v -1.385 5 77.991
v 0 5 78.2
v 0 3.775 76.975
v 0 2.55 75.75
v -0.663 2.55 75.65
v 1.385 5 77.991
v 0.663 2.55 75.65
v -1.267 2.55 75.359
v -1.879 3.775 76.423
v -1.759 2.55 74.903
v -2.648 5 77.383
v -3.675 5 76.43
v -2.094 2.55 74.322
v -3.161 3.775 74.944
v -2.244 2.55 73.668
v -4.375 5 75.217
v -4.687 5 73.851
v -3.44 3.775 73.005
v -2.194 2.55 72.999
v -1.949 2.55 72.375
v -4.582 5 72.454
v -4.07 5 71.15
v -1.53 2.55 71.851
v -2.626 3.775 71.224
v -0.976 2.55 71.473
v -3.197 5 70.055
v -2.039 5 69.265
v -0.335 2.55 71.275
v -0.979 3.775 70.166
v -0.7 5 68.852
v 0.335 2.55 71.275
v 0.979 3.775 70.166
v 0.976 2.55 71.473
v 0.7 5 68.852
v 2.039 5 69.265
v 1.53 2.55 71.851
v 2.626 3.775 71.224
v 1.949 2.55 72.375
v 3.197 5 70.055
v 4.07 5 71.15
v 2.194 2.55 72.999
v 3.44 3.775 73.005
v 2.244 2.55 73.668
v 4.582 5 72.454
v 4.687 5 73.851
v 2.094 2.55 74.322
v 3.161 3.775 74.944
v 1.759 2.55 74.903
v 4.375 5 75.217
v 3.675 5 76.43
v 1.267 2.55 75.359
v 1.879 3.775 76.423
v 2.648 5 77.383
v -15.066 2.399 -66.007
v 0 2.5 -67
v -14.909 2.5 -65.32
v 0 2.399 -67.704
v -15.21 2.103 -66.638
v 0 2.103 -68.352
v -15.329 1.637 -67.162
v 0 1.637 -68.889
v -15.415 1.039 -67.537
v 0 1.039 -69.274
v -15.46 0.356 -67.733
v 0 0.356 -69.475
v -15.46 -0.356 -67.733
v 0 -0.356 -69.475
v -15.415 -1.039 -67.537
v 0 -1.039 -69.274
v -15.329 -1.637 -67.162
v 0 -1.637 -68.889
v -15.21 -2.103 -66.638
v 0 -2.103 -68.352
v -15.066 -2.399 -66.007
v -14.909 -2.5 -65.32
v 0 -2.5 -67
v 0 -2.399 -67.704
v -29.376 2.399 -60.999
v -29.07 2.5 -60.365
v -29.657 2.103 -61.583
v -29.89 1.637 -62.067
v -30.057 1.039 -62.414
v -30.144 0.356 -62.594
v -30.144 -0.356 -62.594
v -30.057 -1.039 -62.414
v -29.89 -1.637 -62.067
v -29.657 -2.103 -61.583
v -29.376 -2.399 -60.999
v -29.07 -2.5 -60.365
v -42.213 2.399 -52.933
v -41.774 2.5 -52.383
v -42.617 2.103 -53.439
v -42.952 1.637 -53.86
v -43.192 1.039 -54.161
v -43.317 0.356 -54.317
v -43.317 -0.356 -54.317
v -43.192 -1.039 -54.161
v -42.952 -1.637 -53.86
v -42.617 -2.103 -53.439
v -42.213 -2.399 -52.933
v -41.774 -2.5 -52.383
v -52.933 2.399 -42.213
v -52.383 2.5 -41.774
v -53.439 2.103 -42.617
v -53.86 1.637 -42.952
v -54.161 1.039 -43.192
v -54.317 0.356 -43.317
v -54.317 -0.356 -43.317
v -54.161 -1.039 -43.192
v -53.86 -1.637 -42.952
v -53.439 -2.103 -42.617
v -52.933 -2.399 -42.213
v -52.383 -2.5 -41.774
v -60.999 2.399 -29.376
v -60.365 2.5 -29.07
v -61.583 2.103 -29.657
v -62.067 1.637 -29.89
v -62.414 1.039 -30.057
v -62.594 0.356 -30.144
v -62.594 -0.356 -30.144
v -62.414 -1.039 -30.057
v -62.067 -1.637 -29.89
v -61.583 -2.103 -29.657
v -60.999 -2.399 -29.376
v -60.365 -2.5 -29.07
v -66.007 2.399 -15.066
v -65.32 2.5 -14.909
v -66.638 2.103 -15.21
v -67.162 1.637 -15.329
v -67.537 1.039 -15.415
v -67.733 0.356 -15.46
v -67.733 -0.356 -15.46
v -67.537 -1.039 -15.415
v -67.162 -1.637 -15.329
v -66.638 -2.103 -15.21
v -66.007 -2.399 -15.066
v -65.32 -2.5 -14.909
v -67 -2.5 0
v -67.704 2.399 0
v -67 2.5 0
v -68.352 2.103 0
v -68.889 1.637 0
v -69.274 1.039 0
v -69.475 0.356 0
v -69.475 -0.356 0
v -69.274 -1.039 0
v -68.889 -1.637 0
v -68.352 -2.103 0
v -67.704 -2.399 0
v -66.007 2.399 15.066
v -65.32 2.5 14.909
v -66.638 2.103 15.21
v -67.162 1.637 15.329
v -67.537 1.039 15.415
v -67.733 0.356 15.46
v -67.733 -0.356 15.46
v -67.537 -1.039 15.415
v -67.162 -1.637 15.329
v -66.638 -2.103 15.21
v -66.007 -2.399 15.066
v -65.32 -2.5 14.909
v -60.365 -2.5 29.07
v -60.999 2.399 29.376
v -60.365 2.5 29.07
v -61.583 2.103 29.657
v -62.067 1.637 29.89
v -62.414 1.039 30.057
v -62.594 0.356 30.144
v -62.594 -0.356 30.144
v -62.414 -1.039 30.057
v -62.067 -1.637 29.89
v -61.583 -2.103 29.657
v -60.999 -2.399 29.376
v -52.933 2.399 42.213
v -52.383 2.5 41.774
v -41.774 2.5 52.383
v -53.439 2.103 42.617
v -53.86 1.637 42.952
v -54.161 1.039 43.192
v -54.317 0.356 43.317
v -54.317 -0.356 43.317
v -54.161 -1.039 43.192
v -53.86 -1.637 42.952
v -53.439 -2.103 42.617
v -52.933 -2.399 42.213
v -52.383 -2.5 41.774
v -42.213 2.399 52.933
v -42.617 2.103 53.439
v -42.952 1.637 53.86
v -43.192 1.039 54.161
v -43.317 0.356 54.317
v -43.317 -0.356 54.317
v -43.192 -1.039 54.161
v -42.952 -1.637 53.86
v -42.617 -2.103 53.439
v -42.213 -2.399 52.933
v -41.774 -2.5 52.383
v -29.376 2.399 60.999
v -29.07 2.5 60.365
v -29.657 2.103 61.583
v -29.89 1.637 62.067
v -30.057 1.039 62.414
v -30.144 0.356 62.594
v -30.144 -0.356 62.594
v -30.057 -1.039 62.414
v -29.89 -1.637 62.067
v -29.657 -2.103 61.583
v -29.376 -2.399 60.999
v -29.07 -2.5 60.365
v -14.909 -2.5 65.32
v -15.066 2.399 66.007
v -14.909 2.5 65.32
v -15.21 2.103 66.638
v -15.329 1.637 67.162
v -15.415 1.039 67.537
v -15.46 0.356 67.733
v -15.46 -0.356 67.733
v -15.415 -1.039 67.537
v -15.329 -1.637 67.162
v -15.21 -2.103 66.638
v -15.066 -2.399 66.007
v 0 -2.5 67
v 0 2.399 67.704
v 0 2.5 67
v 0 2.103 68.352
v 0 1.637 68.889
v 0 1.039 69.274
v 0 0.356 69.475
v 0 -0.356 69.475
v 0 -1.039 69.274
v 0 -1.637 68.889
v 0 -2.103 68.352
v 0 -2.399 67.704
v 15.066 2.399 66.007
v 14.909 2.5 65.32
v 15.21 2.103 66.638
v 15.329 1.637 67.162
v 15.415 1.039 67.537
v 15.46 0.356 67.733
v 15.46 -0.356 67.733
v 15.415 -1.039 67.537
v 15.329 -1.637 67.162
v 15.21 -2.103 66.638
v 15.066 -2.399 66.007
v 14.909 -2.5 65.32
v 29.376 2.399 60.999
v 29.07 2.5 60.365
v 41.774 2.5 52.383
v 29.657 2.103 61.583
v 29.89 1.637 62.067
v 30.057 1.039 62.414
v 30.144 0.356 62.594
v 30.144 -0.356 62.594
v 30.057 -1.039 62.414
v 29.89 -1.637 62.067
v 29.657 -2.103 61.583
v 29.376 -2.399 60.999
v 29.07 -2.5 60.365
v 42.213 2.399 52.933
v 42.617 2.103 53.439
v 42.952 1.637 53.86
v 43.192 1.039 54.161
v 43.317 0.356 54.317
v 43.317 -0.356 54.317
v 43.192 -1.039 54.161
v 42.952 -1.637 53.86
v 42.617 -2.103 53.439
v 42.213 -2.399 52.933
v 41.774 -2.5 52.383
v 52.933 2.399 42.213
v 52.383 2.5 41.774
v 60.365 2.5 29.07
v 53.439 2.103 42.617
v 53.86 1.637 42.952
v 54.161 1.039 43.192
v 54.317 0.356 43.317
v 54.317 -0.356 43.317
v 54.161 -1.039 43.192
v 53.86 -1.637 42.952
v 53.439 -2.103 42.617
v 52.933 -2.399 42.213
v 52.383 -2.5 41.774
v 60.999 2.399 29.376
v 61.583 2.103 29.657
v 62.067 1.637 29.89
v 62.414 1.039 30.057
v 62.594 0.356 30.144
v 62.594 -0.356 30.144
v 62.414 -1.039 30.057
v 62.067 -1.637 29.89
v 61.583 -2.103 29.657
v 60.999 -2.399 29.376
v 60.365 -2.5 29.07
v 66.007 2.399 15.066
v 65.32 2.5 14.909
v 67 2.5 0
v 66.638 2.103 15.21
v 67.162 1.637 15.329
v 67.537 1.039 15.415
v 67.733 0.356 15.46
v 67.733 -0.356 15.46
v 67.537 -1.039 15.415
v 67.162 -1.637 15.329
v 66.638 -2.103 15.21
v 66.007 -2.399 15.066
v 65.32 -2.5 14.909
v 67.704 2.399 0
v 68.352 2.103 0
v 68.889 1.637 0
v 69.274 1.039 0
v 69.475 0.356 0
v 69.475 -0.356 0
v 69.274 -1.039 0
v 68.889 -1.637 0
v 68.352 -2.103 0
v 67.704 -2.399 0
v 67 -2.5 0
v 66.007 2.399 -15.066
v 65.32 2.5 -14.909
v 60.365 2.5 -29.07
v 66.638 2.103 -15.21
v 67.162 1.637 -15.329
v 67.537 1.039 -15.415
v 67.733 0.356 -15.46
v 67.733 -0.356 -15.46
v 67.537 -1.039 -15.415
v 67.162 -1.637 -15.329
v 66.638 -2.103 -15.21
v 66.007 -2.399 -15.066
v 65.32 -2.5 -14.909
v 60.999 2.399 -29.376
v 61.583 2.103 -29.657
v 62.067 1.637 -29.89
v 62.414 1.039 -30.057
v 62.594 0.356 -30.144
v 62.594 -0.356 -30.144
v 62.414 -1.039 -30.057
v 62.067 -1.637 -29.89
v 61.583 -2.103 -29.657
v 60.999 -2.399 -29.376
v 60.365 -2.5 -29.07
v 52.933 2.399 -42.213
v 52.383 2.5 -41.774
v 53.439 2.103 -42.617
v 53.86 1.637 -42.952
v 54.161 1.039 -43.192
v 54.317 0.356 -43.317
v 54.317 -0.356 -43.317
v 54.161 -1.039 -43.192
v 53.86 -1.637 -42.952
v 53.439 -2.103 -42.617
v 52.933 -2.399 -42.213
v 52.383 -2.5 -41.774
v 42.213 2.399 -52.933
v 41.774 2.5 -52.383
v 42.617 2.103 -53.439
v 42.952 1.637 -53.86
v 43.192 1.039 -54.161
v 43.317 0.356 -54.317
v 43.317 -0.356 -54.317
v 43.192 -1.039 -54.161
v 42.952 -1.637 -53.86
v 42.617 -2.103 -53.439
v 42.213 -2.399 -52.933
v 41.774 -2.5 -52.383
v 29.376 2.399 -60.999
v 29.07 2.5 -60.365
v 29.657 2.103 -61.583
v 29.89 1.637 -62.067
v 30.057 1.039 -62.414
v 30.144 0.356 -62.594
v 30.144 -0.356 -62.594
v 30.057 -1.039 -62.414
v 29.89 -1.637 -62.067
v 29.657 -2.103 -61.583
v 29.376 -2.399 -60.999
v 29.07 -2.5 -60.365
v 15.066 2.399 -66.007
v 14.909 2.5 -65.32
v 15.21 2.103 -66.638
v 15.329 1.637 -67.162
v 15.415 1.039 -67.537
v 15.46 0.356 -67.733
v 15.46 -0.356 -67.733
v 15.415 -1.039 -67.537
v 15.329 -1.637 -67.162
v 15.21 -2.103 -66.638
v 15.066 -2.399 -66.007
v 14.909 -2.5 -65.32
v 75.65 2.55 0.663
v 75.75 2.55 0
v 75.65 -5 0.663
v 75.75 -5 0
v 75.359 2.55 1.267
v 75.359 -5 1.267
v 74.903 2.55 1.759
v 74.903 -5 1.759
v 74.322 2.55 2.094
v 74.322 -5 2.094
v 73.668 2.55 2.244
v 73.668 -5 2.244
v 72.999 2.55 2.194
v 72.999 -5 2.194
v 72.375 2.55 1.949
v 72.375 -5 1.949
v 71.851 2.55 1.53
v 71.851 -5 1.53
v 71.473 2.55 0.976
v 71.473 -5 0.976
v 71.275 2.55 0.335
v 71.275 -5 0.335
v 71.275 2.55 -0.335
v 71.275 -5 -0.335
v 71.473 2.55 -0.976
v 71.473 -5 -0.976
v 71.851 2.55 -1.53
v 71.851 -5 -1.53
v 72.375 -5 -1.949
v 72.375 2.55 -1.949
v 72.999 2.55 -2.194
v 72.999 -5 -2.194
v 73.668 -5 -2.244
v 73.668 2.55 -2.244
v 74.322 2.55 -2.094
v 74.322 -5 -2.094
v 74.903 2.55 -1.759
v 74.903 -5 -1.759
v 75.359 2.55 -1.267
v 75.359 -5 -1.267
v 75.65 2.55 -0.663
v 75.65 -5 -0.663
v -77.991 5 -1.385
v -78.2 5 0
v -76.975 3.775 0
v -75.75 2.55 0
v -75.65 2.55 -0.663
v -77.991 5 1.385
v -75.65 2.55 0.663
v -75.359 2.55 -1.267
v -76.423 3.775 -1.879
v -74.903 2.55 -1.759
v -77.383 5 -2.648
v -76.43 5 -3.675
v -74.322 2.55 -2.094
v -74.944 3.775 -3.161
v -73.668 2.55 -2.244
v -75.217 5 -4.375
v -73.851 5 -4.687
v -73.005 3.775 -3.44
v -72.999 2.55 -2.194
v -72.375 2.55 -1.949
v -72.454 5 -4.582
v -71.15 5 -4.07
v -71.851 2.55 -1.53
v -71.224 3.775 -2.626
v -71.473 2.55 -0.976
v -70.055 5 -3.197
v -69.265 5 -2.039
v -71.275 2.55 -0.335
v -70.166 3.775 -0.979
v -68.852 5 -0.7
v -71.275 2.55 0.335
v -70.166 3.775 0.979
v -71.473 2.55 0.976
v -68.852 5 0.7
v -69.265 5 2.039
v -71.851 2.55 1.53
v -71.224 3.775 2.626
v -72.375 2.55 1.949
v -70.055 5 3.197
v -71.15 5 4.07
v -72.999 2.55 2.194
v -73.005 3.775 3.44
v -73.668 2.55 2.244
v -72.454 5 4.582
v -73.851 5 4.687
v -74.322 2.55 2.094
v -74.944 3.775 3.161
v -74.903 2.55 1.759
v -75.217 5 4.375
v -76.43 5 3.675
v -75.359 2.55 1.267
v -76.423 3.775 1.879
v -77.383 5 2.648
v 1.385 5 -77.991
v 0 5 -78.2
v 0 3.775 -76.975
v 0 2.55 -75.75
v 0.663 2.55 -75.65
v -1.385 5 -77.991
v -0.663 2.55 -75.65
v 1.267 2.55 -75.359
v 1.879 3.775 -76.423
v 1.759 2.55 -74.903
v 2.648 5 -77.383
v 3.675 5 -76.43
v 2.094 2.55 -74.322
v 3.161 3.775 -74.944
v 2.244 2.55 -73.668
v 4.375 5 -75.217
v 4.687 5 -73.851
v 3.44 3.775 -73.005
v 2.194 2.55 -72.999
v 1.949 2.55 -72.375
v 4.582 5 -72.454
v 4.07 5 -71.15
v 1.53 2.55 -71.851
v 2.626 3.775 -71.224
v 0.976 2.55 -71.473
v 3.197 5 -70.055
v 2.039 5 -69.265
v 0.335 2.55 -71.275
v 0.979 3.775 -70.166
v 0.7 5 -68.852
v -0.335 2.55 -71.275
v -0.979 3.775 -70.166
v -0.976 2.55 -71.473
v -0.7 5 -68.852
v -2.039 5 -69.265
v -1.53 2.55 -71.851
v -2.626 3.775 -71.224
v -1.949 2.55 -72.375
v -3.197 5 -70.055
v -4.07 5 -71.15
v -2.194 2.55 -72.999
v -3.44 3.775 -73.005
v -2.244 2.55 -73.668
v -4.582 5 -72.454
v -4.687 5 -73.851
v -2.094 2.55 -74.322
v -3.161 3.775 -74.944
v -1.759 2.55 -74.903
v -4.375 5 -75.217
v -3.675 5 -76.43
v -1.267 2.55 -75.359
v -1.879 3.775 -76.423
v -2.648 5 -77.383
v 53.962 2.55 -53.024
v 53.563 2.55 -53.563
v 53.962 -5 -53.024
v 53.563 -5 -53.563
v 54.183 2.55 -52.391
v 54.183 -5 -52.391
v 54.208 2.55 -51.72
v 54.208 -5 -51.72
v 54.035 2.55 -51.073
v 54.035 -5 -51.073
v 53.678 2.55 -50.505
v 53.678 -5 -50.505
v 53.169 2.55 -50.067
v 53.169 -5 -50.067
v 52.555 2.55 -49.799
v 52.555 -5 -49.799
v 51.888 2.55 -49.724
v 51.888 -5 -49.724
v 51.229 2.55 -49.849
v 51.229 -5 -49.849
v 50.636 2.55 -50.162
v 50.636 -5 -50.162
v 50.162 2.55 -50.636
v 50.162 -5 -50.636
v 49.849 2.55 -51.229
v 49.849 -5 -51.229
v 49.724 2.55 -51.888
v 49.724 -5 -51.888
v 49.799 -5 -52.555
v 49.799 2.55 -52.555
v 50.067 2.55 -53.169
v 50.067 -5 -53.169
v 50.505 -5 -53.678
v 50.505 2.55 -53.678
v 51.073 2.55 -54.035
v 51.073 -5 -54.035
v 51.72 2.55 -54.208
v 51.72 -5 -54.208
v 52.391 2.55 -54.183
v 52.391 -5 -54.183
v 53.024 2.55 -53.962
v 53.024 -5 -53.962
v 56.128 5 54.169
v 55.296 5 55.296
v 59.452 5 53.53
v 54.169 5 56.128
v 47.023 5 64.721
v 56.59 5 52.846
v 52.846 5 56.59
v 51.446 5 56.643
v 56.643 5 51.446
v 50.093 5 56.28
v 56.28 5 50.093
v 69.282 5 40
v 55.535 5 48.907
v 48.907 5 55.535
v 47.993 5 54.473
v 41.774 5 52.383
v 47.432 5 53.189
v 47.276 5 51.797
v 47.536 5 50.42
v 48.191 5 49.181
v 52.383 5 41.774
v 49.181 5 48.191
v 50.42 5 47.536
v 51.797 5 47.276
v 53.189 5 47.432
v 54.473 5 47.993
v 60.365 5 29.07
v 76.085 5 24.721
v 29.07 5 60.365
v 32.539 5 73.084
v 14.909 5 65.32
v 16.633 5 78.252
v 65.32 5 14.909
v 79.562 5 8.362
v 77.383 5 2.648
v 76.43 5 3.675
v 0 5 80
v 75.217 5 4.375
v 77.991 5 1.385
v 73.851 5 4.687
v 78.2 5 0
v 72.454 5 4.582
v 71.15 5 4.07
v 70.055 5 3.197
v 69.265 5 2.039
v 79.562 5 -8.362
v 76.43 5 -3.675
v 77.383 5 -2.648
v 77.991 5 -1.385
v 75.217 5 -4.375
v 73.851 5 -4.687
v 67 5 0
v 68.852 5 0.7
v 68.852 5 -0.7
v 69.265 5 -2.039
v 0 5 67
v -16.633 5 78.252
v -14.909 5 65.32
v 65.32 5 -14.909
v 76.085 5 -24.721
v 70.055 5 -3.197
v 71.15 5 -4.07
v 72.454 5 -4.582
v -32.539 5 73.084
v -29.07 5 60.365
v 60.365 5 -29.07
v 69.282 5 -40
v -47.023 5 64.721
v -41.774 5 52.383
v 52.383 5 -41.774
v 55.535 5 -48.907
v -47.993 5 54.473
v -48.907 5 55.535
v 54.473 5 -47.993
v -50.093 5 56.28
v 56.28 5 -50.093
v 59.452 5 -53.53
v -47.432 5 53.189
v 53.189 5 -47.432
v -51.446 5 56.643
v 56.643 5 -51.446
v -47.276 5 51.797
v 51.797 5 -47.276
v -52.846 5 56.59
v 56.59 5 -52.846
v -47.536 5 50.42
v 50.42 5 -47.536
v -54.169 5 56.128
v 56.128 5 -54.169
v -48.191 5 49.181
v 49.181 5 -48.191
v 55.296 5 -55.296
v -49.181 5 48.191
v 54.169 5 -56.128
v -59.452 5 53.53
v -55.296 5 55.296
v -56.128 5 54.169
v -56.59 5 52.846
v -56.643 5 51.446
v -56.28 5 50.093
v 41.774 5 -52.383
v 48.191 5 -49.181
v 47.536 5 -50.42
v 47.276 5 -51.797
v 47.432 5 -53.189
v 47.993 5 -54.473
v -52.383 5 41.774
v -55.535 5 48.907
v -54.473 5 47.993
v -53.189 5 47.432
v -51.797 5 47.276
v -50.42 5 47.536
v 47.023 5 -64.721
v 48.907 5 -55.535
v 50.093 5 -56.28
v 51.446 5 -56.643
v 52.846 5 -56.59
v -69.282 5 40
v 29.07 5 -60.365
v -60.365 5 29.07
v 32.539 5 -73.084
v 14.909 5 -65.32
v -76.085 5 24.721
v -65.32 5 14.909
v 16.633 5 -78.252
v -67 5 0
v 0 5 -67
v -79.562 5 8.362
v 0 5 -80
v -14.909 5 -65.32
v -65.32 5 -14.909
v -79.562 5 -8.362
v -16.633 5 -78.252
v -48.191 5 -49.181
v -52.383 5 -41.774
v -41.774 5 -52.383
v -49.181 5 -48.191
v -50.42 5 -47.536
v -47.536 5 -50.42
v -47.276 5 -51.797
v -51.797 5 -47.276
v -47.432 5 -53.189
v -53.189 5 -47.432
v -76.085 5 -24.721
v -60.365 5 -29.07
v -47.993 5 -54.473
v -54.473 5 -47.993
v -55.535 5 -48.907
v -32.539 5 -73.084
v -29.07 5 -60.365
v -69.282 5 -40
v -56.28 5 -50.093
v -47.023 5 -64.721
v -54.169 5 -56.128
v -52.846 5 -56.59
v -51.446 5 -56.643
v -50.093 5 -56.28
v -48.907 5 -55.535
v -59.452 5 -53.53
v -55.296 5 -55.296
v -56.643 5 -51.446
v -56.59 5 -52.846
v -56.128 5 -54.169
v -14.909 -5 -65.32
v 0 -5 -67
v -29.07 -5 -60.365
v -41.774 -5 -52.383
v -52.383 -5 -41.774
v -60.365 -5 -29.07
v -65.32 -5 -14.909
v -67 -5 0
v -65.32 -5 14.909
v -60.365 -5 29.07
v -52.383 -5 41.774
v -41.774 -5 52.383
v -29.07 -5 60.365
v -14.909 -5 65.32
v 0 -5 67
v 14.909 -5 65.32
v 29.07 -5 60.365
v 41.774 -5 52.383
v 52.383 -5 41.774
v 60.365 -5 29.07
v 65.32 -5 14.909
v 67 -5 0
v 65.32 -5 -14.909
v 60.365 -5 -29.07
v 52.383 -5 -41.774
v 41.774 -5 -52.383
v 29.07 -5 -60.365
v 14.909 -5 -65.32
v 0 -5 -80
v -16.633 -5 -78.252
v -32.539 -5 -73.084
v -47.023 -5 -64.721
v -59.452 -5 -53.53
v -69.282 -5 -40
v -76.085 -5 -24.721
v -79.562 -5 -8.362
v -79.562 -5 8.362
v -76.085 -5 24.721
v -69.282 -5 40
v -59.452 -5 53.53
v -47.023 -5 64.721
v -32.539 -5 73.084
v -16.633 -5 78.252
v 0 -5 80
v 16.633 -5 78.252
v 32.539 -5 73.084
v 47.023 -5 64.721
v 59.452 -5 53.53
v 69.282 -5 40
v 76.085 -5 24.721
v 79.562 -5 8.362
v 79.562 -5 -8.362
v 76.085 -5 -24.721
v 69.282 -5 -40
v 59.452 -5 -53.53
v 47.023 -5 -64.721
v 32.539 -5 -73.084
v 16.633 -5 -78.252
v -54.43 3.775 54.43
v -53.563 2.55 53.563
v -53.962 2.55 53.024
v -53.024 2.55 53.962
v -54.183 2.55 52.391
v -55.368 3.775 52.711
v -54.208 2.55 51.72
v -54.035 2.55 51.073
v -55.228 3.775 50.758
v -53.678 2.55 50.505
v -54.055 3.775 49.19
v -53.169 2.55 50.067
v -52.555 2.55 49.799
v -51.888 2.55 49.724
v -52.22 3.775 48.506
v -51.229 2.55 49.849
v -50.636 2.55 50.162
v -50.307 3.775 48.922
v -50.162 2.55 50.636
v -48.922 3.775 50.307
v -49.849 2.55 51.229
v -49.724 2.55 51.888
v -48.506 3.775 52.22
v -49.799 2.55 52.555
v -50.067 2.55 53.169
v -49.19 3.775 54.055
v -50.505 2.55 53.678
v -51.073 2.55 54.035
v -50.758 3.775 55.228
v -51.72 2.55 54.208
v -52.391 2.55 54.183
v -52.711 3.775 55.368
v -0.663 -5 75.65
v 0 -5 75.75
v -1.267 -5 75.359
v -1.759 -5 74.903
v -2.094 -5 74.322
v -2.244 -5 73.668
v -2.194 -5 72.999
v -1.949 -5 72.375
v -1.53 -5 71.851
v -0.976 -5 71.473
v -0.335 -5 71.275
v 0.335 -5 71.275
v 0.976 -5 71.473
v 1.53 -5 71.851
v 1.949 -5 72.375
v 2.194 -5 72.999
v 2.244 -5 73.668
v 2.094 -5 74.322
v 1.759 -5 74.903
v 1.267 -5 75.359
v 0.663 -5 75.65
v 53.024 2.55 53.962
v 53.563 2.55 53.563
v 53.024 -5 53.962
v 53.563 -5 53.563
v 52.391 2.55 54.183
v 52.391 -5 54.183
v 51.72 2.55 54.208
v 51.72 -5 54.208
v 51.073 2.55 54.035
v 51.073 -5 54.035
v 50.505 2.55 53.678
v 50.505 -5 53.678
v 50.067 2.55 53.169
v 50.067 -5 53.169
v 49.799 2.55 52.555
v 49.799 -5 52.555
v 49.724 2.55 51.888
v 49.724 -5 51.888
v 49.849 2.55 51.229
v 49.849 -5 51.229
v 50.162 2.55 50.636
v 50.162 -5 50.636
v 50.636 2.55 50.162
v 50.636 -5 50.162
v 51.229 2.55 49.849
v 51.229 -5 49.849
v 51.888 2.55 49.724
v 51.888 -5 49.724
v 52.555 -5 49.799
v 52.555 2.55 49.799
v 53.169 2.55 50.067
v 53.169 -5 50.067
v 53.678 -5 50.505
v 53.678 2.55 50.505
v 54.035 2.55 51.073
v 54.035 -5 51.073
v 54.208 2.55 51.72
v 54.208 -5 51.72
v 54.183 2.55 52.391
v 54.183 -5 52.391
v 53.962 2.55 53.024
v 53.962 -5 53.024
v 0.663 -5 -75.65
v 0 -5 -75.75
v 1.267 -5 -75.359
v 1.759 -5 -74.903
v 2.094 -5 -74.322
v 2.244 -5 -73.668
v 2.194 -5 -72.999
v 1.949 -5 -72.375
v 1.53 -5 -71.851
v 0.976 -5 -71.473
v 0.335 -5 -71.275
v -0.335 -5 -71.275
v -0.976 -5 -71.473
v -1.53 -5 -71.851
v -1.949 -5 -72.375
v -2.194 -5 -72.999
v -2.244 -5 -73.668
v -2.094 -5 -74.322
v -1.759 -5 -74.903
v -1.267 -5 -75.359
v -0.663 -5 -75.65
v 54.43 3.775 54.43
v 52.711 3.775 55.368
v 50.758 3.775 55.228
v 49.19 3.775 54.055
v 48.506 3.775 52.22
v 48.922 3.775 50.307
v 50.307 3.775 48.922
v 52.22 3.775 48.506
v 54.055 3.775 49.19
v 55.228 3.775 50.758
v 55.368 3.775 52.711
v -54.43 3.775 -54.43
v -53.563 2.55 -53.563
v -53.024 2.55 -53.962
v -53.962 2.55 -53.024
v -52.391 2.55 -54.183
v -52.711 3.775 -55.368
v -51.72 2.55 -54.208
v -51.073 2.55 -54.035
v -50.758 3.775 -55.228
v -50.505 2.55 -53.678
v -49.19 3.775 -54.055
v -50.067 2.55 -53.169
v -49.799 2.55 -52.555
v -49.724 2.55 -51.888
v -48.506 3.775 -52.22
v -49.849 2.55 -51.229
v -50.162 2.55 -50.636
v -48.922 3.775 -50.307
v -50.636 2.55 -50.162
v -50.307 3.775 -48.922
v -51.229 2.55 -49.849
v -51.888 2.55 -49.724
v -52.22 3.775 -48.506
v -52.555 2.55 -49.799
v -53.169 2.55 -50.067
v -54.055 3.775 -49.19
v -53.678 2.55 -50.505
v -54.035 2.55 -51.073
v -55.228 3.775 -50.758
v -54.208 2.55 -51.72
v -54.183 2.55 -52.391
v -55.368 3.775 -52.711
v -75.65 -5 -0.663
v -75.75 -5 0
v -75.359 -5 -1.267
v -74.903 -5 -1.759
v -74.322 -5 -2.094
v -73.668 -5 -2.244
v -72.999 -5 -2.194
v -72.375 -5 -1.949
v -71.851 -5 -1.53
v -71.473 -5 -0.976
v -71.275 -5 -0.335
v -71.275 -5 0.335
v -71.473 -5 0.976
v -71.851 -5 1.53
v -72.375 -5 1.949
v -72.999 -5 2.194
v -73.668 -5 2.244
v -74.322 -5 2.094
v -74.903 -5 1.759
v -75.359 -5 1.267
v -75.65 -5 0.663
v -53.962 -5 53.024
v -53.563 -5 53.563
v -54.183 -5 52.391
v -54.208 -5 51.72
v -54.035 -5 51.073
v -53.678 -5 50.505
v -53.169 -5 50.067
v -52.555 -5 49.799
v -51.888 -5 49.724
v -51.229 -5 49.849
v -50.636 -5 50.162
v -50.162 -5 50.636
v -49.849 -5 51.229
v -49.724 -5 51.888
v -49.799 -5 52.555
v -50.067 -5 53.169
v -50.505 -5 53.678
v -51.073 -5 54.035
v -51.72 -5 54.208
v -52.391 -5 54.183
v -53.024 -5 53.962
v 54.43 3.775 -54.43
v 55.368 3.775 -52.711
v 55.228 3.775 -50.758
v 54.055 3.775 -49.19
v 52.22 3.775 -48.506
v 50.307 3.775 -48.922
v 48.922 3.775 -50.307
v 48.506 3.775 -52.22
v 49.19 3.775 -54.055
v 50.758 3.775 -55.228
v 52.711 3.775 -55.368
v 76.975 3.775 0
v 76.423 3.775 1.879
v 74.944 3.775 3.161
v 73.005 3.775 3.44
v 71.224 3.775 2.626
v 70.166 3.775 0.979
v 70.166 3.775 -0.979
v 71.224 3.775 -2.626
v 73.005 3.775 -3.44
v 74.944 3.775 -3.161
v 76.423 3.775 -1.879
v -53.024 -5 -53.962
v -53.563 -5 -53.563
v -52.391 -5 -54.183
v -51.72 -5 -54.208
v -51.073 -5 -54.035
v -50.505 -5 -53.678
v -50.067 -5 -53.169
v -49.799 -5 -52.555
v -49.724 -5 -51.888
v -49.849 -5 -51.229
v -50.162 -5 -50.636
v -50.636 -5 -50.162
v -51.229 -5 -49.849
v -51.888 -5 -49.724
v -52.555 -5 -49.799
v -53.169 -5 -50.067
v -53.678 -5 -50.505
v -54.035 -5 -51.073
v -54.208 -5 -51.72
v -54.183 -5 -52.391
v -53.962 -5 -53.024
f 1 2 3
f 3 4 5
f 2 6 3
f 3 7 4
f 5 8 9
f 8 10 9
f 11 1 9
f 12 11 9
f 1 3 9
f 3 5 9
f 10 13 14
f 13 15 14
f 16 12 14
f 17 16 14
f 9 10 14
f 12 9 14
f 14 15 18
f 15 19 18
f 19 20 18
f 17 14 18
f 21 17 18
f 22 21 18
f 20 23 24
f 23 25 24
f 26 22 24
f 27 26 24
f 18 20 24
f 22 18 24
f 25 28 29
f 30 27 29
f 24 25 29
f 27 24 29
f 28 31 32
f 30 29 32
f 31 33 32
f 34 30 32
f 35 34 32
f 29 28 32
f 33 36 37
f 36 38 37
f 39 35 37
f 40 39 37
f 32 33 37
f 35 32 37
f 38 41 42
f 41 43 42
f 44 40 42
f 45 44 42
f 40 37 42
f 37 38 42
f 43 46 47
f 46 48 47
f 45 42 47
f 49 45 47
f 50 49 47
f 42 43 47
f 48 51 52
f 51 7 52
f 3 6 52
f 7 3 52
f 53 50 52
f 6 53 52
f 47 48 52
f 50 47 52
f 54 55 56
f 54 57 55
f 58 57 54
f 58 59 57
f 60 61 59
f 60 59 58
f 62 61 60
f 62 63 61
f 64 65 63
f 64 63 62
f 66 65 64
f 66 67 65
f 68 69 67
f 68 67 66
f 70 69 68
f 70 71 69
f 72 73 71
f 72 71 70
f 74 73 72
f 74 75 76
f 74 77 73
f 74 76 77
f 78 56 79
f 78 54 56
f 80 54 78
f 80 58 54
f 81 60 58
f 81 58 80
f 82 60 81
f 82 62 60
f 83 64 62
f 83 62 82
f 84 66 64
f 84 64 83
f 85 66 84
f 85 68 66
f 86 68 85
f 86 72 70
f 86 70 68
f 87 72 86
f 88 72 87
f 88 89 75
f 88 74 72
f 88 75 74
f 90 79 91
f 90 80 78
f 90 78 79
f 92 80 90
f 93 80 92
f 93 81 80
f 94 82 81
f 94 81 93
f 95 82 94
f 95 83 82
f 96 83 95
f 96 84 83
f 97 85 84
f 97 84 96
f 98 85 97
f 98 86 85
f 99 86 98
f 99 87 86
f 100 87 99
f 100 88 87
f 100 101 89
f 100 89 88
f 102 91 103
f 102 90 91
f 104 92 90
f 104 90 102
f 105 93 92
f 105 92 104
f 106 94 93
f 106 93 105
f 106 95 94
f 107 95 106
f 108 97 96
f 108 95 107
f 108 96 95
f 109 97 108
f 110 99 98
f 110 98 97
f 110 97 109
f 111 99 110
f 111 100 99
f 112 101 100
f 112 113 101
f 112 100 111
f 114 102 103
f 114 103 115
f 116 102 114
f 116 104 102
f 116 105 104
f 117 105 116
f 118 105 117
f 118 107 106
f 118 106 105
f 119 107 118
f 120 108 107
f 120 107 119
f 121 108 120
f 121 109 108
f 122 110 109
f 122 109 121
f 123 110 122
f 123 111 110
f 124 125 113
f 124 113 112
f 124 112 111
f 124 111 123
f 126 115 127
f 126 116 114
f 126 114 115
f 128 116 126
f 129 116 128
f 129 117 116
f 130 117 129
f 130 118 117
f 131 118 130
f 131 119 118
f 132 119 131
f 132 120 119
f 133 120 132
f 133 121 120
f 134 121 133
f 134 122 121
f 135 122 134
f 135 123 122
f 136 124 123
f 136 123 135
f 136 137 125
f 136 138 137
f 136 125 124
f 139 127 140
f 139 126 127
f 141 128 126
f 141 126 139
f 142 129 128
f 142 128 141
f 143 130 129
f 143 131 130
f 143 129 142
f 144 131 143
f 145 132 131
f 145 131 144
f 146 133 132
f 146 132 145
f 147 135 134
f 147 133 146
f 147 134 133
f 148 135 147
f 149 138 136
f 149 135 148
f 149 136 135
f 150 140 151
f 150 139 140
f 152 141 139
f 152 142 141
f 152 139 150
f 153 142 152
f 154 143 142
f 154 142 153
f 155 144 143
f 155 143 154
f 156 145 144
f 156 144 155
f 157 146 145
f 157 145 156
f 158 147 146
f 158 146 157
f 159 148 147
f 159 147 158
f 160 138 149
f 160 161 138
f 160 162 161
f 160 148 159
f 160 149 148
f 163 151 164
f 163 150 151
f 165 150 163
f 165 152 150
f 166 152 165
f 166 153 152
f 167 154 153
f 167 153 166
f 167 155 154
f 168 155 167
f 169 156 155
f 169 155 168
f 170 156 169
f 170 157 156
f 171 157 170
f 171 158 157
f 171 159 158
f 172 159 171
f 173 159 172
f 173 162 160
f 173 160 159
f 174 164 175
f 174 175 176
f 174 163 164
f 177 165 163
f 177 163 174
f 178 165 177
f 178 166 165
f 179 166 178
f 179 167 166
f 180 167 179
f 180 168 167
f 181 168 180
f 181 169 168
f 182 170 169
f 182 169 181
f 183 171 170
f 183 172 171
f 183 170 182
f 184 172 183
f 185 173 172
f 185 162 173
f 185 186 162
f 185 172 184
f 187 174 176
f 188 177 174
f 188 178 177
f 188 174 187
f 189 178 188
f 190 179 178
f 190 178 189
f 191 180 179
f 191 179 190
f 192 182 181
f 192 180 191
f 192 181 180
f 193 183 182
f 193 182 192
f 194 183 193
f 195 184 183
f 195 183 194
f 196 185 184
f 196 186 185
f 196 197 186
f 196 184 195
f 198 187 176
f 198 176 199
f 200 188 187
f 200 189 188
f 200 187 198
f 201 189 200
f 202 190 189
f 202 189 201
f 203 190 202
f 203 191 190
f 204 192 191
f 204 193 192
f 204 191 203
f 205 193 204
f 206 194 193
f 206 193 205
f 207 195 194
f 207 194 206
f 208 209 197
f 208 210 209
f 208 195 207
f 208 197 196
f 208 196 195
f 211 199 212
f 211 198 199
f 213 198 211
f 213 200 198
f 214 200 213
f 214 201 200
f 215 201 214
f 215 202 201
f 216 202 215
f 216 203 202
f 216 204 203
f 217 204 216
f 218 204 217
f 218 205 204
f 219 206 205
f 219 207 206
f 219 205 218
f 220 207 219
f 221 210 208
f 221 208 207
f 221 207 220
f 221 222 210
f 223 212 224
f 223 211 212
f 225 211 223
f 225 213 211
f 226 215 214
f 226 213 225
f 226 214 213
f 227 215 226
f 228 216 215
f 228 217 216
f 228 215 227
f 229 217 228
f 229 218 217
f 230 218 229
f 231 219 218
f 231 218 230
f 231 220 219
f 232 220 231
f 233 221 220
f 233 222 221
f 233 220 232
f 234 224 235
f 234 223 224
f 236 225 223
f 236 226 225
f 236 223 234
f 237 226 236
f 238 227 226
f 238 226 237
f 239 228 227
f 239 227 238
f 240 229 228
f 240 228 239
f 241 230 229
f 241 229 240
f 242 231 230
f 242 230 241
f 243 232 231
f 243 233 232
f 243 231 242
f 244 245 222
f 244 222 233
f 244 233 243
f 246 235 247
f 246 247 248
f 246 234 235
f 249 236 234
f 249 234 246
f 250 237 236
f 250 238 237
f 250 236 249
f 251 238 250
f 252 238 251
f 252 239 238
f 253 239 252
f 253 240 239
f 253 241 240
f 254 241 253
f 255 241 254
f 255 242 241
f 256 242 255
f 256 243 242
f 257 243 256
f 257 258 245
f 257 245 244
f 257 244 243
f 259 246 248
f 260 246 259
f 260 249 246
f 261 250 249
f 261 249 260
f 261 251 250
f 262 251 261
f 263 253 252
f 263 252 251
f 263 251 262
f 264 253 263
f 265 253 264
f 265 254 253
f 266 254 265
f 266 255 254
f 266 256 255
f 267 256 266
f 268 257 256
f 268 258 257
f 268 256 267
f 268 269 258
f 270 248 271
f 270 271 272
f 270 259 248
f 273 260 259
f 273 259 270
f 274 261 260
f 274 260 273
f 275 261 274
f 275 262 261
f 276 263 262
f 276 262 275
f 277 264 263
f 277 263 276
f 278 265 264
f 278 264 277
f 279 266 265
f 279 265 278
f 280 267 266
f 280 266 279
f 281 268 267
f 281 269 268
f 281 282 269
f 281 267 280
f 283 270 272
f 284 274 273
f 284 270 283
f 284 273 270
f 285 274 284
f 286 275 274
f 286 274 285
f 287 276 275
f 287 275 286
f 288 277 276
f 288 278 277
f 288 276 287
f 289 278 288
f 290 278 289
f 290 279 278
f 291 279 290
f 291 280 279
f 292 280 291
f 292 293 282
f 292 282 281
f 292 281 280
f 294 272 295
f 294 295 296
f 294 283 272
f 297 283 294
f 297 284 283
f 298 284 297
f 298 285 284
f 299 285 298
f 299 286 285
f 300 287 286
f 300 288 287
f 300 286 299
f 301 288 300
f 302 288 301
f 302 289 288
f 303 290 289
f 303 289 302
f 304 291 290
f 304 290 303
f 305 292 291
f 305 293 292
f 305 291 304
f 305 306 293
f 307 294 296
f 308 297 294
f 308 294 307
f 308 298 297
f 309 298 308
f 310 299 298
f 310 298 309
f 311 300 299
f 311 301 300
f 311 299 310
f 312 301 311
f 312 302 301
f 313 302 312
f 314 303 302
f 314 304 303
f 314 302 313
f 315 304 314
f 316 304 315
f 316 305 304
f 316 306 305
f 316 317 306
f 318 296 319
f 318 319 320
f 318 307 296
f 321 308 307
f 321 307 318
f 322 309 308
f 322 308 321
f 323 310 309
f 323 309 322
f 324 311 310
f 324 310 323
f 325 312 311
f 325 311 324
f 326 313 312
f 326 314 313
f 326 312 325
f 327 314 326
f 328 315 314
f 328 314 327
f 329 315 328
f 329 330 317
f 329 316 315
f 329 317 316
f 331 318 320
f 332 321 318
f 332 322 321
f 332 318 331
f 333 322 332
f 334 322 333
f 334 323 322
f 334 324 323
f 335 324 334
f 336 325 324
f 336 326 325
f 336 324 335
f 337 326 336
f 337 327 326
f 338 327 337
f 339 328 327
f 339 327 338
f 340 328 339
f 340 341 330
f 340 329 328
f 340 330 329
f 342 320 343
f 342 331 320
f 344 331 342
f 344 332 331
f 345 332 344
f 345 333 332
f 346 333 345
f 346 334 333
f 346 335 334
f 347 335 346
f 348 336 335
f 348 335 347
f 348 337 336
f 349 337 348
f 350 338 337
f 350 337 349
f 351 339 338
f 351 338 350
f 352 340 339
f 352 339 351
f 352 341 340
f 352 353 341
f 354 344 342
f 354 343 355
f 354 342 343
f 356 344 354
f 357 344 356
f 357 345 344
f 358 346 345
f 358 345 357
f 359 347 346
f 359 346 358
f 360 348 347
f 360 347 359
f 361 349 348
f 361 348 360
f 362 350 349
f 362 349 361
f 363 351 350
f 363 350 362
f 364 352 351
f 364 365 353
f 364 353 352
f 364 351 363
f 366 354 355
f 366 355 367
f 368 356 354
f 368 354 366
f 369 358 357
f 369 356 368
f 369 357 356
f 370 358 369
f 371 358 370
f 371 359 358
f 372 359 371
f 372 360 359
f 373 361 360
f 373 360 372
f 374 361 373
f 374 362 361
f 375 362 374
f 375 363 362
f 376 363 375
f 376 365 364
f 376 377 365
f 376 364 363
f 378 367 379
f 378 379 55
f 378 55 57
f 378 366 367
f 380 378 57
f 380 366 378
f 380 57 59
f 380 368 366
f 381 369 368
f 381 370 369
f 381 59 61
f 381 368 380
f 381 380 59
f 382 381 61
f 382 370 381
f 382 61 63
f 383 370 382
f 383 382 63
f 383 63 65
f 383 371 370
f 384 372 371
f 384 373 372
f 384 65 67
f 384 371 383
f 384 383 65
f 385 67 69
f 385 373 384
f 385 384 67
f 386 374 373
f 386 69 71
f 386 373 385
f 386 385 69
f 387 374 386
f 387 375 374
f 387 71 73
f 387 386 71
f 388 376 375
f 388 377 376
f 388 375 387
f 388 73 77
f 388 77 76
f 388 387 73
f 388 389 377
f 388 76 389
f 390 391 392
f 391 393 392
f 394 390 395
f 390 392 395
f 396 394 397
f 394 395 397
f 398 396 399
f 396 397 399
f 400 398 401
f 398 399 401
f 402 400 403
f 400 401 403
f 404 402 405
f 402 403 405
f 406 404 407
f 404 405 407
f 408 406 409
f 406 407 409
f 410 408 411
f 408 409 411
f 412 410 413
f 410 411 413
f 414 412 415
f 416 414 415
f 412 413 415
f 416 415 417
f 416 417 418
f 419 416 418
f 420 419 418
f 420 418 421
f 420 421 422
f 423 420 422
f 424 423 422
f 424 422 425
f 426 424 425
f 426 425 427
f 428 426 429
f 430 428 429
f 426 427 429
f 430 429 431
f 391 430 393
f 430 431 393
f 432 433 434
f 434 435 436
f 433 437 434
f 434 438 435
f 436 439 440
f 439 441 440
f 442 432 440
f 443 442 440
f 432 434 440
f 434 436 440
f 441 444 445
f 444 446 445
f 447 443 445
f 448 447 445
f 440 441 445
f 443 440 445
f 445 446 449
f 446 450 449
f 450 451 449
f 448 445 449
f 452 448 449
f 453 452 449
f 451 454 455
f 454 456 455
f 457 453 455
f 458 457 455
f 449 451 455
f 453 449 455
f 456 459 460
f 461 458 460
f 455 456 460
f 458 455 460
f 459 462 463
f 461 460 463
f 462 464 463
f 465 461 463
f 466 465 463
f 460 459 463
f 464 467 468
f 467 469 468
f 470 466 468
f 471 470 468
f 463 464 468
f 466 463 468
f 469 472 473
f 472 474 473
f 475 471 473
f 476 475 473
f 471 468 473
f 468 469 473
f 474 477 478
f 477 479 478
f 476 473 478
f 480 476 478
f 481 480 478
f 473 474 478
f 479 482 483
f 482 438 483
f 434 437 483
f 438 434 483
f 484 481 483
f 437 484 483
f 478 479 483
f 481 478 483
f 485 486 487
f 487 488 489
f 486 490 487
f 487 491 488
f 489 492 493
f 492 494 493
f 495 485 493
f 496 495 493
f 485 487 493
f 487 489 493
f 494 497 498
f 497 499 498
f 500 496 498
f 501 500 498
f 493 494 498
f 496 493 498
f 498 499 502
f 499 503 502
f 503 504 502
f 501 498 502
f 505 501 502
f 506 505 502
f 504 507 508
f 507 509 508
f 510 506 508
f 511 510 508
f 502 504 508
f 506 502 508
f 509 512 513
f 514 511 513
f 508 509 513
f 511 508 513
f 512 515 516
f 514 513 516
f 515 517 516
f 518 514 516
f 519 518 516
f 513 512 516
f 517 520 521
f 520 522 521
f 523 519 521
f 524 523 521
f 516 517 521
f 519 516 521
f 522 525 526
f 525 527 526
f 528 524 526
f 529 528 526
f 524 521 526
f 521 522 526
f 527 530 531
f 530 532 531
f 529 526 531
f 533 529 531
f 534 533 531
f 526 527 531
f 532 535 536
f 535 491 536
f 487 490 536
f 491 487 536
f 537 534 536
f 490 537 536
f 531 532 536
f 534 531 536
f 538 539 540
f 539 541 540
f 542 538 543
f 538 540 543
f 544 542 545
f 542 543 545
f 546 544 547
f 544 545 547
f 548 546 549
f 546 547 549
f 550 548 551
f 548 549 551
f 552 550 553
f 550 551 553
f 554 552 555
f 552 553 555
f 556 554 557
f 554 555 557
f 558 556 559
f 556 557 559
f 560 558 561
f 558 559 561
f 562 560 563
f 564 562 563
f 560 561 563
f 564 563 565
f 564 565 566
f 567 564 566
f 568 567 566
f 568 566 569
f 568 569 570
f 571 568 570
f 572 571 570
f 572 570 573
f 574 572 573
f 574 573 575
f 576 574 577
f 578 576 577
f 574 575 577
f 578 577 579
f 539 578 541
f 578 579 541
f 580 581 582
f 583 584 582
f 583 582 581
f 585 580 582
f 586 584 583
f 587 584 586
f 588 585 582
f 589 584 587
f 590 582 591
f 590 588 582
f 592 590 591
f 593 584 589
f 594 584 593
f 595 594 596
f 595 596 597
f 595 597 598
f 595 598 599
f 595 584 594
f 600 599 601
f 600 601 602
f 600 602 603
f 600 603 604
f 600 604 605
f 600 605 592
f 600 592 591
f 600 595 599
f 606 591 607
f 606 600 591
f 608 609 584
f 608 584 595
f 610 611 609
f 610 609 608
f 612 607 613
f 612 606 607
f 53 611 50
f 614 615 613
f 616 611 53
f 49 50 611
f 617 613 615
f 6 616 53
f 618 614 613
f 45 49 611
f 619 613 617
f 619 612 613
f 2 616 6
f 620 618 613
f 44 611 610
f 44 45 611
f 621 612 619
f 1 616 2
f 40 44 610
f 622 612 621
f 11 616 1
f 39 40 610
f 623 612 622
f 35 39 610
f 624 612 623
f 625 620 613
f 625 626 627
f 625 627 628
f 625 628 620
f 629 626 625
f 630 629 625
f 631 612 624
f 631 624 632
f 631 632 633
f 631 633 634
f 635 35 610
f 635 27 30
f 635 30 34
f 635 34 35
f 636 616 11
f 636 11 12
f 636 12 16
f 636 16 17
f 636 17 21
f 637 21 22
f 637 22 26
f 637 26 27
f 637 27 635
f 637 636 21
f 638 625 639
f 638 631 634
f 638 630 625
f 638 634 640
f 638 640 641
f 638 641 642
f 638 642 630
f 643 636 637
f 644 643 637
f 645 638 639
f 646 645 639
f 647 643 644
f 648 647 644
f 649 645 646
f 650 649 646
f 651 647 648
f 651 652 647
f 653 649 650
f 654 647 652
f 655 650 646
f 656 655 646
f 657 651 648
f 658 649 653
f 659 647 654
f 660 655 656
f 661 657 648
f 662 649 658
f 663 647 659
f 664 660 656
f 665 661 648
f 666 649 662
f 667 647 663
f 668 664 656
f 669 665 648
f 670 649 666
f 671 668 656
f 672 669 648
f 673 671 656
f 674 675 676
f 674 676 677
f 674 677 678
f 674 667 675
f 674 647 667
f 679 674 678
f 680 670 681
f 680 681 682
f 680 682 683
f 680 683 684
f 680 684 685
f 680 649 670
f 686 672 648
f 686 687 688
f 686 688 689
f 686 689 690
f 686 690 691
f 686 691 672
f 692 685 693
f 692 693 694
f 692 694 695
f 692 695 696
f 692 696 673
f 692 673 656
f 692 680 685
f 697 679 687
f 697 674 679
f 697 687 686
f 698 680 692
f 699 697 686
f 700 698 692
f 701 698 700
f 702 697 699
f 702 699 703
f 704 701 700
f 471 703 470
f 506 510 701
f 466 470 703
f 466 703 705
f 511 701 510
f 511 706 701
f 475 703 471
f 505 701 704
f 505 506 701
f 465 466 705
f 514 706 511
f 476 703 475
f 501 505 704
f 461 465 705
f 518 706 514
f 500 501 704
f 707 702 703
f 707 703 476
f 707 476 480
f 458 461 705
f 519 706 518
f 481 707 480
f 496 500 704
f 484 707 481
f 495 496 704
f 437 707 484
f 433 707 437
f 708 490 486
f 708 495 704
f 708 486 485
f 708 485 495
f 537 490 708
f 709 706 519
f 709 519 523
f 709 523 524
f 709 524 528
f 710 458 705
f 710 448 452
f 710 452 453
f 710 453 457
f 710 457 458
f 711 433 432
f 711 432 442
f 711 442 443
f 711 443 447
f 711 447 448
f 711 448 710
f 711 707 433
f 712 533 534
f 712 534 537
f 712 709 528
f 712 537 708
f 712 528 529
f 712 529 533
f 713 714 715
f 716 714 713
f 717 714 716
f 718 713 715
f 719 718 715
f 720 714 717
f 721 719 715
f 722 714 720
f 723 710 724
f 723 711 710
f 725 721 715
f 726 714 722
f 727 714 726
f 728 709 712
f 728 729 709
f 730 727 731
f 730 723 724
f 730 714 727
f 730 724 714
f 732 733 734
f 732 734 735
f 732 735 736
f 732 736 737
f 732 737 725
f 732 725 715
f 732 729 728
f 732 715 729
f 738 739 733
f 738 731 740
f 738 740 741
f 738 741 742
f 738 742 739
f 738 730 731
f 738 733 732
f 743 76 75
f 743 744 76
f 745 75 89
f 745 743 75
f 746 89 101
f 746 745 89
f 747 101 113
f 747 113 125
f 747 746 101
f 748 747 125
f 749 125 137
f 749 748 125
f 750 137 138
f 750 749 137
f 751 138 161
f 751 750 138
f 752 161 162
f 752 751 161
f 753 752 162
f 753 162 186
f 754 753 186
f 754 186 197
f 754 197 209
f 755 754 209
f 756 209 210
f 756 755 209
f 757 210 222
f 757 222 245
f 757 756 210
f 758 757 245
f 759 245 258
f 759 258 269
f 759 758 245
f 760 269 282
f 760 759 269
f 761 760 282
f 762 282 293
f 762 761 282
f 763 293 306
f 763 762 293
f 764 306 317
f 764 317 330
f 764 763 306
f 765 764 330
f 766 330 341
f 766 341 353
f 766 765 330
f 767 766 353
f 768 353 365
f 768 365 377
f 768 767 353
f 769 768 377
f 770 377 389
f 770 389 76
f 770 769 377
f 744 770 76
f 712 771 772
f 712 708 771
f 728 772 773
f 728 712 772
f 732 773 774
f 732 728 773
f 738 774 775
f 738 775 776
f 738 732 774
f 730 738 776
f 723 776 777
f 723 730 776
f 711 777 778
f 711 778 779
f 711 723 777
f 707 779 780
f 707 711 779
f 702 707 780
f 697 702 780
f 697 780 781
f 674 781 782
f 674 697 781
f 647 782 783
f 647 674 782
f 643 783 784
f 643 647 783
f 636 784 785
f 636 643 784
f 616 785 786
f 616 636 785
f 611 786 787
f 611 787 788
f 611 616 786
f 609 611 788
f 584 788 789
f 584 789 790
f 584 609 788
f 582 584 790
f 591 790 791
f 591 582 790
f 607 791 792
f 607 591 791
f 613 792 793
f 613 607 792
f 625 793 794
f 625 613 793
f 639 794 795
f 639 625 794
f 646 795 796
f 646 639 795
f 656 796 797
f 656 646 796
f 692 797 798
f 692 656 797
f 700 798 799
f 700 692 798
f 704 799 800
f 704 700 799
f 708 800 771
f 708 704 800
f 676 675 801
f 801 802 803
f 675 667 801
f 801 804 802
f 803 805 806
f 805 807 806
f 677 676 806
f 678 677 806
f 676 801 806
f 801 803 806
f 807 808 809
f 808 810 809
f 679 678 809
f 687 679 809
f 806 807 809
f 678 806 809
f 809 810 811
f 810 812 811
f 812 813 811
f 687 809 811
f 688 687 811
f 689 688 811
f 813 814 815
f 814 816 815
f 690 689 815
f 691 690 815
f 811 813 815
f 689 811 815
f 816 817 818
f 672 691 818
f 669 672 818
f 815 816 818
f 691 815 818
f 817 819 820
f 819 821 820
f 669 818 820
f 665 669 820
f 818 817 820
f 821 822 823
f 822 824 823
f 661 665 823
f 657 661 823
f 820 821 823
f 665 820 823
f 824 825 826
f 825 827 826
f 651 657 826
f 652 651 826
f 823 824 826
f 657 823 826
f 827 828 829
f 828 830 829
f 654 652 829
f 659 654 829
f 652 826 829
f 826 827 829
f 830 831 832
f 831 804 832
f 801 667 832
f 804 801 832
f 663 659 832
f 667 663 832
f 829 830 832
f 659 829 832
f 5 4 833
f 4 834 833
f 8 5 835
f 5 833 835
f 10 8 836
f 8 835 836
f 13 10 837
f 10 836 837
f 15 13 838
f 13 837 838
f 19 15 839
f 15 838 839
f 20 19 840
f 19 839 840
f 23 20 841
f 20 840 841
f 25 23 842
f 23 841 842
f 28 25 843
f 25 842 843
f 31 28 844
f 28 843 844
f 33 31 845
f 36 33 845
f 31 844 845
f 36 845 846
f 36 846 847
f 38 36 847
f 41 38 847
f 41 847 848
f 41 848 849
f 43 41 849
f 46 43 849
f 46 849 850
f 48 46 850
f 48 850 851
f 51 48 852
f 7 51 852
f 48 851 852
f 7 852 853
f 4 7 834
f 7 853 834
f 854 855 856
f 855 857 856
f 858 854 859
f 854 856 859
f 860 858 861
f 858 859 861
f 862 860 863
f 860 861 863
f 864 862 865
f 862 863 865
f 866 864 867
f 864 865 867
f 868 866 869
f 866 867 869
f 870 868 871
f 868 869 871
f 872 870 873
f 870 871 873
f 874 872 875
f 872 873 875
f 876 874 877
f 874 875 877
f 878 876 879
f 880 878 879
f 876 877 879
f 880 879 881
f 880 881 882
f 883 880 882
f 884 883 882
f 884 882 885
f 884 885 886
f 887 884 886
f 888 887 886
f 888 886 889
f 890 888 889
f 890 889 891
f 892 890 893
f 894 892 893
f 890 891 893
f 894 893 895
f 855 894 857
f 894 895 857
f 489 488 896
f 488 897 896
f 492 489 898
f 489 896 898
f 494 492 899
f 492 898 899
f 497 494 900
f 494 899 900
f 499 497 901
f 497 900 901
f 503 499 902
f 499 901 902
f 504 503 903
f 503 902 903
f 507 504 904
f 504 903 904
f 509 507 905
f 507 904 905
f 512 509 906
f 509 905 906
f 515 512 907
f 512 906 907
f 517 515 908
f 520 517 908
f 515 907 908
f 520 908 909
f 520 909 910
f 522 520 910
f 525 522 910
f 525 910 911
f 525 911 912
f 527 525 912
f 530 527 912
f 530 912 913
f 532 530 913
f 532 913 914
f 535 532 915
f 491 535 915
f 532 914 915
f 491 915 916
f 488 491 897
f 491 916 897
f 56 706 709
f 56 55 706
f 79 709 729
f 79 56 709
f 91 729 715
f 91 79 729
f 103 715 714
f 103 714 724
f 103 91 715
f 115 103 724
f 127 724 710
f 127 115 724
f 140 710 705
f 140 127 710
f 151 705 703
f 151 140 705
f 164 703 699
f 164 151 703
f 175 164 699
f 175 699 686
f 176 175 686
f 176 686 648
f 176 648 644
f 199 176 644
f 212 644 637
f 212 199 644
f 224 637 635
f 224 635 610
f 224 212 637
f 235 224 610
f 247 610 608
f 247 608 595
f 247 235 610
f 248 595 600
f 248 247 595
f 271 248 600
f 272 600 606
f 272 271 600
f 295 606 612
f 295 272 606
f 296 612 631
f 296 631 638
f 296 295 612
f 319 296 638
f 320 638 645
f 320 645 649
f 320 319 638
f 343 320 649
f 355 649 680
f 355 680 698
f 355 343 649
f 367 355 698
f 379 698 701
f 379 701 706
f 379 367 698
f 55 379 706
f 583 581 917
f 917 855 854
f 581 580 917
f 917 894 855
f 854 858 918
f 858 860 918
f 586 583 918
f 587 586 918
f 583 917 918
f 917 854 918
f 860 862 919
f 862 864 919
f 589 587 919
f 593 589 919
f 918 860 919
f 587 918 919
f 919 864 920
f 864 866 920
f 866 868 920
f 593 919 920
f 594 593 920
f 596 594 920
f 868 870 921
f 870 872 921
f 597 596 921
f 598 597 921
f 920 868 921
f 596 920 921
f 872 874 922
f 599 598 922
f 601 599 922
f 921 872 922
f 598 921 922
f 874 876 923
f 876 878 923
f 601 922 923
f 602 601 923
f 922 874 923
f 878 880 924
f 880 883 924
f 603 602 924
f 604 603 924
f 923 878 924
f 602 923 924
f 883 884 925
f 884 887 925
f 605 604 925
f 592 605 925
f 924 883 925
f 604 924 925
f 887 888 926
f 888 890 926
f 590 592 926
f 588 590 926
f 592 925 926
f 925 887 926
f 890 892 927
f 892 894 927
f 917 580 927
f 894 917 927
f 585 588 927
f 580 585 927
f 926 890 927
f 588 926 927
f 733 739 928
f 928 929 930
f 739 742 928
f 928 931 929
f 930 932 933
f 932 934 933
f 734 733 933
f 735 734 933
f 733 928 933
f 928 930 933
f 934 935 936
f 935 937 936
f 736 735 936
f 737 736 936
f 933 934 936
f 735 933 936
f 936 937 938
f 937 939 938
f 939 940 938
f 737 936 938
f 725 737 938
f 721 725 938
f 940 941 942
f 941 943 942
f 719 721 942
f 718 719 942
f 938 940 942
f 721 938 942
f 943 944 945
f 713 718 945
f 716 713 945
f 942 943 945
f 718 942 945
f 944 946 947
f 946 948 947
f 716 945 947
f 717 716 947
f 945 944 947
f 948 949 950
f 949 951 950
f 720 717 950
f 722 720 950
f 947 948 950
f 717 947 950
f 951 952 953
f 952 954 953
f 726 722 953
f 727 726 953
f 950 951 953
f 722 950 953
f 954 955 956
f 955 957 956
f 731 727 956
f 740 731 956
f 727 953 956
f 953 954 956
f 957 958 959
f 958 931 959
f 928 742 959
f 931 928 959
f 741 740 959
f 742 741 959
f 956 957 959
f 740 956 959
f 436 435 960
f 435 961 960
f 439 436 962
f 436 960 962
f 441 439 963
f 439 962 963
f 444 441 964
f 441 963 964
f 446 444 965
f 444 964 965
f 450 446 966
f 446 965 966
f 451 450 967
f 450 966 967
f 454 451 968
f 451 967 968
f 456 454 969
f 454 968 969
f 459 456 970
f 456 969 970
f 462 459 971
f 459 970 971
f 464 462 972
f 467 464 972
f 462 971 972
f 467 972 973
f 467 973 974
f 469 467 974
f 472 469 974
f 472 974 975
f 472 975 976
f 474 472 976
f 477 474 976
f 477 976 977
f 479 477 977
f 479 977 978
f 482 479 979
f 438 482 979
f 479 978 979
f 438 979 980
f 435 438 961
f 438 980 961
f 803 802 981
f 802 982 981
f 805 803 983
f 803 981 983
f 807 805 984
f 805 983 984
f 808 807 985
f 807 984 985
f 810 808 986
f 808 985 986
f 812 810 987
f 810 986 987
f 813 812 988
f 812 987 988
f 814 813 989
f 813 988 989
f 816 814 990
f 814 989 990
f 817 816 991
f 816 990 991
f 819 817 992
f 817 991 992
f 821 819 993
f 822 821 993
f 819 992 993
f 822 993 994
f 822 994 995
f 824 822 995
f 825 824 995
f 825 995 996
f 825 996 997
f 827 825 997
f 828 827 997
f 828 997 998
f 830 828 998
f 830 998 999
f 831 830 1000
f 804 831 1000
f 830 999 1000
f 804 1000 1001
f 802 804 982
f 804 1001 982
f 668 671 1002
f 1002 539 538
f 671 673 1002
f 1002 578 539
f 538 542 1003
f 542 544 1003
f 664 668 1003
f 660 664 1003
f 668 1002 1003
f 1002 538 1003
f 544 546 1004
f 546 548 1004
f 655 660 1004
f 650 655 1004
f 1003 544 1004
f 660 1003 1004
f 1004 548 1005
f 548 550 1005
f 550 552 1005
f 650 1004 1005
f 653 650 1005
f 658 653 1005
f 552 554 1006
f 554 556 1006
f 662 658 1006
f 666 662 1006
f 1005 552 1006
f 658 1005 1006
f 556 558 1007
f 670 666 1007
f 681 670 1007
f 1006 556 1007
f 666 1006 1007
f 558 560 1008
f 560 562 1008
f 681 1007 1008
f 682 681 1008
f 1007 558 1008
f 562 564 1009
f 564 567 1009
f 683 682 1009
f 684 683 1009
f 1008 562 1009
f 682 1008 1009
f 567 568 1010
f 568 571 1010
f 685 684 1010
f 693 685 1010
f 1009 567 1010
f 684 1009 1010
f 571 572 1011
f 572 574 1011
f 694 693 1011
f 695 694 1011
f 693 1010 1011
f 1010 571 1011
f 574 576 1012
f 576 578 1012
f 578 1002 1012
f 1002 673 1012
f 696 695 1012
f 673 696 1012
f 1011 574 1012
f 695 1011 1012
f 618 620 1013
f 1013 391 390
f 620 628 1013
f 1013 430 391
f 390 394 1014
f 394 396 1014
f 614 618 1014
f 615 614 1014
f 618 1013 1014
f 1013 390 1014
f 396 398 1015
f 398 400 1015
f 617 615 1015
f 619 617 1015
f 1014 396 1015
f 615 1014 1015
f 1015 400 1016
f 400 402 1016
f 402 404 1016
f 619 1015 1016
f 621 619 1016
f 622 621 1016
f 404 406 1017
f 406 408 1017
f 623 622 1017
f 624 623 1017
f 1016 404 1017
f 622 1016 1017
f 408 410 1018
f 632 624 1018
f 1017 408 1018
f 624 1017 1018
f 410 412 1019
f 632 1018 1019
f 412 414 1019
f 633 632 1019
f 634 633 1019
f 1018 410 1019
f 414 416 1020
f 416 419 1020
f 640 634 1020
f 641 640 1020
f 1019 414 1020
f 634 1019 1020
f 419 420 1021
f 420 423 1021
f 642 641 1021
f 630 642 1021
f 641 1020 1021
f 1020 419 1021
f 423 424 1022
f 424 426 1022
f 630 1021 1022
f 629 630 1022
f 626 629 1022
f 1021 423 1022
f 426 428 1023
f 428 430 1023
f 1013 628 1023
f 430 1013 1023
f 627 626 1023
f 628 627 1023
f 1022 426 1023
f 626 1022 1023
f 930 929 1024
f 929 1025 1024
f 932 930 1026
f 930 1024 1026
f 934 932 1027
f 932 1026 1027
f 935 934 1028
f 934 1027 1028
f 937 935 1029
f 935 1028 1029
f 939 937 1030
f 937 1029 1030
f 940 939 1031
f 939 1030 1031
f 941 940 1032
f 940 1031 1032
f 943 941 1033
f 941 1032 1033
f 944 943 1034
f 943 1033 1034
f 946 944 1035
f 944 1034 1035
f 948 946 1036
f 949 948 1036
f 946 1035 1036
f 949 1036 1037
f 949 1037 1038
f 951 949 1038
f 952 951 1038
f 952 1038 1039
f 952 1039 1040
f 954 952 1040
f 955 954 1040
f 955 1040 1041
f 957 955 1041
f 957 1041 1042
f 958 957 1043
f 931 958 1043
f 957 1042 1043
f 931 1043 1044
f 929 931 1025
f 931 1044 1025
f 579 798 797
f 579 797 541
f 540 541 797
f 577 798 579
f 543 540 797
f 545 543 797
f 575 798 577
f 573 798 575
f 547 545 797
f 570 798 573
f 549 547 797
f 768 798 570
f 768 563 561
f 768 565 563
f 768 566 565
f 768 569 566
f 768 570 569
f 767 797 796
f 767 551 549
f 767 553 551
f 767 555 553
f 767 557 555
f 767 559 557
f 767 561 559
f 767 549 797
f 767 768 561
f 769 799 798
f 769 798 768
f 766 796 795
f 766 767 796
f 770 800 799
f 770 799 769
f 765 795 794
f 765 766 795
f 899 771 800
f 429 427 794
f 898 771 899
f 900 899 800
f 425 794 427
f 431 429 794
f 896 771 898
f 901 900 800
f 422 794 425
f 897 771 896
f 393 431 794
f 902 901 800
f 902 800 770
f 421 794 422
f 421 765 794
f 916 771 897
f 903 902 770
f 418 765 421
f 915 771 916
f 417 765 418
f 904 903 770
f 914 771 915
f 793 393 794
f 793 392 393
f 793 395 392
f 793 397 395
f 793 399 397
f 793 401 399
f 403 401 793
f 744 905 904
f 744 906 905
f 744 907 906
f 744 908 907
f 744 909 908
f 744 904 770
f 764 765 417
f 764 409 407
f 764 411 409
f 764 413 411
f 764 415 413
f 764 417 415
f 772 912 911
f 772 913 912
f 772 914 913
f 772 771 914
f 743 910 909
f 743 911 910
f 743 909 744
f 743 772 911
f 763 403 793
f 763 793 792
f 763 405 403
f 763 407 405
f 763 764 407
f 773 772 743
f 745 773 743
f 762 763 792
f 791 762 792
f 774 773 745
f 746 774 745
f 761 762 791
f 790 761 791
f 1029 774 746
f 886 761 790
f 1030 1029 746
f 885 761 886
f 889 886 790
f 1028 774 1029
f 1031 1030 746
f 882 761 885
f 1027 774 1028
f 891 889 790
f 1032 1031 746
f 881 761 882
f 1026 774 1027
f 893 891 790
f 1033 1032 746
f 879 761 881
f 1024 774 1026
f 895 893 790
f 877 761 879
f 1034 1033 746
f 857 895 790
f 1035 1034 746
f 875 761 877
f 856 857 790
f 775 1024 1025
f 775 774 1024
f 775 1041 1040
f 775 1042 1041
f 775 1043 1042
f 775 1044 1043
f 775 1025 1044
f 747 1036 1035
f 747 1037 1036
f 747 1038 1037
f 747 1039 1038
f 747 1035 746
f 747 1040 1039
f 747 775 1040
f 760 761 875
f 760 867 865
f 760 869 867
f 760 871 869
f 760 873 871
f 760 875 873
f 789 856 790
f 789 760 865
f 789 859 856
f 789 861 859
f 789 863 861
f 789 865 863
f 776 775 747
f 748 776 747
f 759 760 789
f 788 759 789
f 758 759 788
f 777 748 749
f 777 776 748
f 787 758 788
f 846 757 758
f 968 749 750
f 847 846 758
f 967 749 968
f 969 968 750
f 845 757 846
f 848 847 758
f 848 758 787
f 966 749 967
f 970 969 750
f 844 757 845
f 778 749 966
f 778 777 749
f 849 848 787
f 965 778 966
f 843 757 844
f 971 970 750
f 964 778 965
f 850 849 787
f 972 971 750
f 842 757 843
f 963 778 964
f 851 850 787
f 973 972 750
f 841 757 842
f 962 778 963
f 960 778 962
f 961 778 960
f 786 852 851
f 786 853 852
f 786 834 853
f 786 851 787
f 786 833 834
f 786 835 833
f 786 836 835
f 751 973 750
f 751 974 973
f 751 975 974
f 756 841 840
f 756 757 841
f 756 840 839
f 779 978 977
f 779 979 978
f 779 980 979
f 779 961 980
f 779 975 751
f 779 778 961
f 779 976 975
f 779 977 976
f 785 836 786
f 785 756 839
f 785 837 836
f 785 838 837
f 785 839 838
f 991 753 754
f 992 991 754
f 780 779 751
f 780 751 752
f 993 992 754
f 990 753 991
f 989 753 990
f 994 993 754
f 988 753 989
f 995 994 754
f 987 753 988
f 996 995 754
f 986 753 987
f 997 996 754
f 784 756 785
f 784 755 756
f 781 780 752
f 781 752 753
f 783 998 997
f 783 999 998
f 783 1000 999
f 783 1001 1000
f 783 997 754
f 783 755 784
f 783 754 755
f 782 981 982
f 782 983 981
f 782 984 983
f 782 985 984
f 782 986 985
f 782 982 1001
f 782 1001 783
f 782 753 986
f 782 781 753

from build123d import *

# Parameters (mm, degrees)
CSK_FOR_M4_COUNTERSUNK_FLAT_HEAD_SCREW1_D           = 4.5
CSK_FOR_M4_COUNTERSUNK_FLAT_HEAD_SCREW1_CSINK_D     = 9.4
CSK_FOR_M4_COUNTERSUNK_FLAT_HEAD_SCREW1_CSINK_ANGLE = 90
CIRPATTERN1_COUNT                                   = 8


with BuildPart() as part:
    # Sketch1 → Revolve1 (revolve)
    with BuildSketch(Plane.XY, mode=Mode.PRIVATE) as revolve1_sk:
        with BuildLine():
            Line((-67, -2.5), (-67, -5))
            Line((-67, -5), (-80, -5))
            Line((-80, -5), (-80, 5))
            Line((-80, 5), (-67, 5))
            Line((-67, 5), (-67, 2.5))
            ThreePointArc((-67, 2.5), (-69.5, 0), (-67, -2.5))
        make_face()
    revolve(revolve1_sk.sketch.rotate(Axis((0, -5.61, 0), (0, 1, 0)), 270), axis=Axis((0, -5.61, 0), (0, 1, 0)))

    # CSK for M4 Countersunk Flat Head Screw1 (through all)
    with Locations(Plane(origin=(0, 5, 0), x_dir=(1, 0, 0), z_dir=(0, 1, 0))):
        with Locations((-73.5, 0)):
            csk_for_m4_countersunk_flat_head_screw1 = CounterSinkHole(CSK_FOR_M4_COUNTERSUNK_FLAT_HEAD_SCREW1_D / 2, CSK_FOR_M4_COUNTERSUNK_FLAT_HEAD_SCREW1_CSINK_D / 2, counter_sink_angle=CSK_FOR_M4_COUNTERSUNK_FLAT_HEAD_SCREW1_CSINK_ANGLE)

    # CirPattern1: CSK for M4 Countersunk Flat Head Screw1 ×8 about axis
    cirpattern1_axis = Axis((0, 0, 0), (0, 1, 0))
    for i in range(1, CIRPATTERN1_COUNT):
        add(csk_for_m4_countersunk_flat_head_screw1.rotate(cirpattern1_axis, i * 360 / CIRPATTERN1_COUNT), mode=Mode.SUBTRACT)


solid = part.part
